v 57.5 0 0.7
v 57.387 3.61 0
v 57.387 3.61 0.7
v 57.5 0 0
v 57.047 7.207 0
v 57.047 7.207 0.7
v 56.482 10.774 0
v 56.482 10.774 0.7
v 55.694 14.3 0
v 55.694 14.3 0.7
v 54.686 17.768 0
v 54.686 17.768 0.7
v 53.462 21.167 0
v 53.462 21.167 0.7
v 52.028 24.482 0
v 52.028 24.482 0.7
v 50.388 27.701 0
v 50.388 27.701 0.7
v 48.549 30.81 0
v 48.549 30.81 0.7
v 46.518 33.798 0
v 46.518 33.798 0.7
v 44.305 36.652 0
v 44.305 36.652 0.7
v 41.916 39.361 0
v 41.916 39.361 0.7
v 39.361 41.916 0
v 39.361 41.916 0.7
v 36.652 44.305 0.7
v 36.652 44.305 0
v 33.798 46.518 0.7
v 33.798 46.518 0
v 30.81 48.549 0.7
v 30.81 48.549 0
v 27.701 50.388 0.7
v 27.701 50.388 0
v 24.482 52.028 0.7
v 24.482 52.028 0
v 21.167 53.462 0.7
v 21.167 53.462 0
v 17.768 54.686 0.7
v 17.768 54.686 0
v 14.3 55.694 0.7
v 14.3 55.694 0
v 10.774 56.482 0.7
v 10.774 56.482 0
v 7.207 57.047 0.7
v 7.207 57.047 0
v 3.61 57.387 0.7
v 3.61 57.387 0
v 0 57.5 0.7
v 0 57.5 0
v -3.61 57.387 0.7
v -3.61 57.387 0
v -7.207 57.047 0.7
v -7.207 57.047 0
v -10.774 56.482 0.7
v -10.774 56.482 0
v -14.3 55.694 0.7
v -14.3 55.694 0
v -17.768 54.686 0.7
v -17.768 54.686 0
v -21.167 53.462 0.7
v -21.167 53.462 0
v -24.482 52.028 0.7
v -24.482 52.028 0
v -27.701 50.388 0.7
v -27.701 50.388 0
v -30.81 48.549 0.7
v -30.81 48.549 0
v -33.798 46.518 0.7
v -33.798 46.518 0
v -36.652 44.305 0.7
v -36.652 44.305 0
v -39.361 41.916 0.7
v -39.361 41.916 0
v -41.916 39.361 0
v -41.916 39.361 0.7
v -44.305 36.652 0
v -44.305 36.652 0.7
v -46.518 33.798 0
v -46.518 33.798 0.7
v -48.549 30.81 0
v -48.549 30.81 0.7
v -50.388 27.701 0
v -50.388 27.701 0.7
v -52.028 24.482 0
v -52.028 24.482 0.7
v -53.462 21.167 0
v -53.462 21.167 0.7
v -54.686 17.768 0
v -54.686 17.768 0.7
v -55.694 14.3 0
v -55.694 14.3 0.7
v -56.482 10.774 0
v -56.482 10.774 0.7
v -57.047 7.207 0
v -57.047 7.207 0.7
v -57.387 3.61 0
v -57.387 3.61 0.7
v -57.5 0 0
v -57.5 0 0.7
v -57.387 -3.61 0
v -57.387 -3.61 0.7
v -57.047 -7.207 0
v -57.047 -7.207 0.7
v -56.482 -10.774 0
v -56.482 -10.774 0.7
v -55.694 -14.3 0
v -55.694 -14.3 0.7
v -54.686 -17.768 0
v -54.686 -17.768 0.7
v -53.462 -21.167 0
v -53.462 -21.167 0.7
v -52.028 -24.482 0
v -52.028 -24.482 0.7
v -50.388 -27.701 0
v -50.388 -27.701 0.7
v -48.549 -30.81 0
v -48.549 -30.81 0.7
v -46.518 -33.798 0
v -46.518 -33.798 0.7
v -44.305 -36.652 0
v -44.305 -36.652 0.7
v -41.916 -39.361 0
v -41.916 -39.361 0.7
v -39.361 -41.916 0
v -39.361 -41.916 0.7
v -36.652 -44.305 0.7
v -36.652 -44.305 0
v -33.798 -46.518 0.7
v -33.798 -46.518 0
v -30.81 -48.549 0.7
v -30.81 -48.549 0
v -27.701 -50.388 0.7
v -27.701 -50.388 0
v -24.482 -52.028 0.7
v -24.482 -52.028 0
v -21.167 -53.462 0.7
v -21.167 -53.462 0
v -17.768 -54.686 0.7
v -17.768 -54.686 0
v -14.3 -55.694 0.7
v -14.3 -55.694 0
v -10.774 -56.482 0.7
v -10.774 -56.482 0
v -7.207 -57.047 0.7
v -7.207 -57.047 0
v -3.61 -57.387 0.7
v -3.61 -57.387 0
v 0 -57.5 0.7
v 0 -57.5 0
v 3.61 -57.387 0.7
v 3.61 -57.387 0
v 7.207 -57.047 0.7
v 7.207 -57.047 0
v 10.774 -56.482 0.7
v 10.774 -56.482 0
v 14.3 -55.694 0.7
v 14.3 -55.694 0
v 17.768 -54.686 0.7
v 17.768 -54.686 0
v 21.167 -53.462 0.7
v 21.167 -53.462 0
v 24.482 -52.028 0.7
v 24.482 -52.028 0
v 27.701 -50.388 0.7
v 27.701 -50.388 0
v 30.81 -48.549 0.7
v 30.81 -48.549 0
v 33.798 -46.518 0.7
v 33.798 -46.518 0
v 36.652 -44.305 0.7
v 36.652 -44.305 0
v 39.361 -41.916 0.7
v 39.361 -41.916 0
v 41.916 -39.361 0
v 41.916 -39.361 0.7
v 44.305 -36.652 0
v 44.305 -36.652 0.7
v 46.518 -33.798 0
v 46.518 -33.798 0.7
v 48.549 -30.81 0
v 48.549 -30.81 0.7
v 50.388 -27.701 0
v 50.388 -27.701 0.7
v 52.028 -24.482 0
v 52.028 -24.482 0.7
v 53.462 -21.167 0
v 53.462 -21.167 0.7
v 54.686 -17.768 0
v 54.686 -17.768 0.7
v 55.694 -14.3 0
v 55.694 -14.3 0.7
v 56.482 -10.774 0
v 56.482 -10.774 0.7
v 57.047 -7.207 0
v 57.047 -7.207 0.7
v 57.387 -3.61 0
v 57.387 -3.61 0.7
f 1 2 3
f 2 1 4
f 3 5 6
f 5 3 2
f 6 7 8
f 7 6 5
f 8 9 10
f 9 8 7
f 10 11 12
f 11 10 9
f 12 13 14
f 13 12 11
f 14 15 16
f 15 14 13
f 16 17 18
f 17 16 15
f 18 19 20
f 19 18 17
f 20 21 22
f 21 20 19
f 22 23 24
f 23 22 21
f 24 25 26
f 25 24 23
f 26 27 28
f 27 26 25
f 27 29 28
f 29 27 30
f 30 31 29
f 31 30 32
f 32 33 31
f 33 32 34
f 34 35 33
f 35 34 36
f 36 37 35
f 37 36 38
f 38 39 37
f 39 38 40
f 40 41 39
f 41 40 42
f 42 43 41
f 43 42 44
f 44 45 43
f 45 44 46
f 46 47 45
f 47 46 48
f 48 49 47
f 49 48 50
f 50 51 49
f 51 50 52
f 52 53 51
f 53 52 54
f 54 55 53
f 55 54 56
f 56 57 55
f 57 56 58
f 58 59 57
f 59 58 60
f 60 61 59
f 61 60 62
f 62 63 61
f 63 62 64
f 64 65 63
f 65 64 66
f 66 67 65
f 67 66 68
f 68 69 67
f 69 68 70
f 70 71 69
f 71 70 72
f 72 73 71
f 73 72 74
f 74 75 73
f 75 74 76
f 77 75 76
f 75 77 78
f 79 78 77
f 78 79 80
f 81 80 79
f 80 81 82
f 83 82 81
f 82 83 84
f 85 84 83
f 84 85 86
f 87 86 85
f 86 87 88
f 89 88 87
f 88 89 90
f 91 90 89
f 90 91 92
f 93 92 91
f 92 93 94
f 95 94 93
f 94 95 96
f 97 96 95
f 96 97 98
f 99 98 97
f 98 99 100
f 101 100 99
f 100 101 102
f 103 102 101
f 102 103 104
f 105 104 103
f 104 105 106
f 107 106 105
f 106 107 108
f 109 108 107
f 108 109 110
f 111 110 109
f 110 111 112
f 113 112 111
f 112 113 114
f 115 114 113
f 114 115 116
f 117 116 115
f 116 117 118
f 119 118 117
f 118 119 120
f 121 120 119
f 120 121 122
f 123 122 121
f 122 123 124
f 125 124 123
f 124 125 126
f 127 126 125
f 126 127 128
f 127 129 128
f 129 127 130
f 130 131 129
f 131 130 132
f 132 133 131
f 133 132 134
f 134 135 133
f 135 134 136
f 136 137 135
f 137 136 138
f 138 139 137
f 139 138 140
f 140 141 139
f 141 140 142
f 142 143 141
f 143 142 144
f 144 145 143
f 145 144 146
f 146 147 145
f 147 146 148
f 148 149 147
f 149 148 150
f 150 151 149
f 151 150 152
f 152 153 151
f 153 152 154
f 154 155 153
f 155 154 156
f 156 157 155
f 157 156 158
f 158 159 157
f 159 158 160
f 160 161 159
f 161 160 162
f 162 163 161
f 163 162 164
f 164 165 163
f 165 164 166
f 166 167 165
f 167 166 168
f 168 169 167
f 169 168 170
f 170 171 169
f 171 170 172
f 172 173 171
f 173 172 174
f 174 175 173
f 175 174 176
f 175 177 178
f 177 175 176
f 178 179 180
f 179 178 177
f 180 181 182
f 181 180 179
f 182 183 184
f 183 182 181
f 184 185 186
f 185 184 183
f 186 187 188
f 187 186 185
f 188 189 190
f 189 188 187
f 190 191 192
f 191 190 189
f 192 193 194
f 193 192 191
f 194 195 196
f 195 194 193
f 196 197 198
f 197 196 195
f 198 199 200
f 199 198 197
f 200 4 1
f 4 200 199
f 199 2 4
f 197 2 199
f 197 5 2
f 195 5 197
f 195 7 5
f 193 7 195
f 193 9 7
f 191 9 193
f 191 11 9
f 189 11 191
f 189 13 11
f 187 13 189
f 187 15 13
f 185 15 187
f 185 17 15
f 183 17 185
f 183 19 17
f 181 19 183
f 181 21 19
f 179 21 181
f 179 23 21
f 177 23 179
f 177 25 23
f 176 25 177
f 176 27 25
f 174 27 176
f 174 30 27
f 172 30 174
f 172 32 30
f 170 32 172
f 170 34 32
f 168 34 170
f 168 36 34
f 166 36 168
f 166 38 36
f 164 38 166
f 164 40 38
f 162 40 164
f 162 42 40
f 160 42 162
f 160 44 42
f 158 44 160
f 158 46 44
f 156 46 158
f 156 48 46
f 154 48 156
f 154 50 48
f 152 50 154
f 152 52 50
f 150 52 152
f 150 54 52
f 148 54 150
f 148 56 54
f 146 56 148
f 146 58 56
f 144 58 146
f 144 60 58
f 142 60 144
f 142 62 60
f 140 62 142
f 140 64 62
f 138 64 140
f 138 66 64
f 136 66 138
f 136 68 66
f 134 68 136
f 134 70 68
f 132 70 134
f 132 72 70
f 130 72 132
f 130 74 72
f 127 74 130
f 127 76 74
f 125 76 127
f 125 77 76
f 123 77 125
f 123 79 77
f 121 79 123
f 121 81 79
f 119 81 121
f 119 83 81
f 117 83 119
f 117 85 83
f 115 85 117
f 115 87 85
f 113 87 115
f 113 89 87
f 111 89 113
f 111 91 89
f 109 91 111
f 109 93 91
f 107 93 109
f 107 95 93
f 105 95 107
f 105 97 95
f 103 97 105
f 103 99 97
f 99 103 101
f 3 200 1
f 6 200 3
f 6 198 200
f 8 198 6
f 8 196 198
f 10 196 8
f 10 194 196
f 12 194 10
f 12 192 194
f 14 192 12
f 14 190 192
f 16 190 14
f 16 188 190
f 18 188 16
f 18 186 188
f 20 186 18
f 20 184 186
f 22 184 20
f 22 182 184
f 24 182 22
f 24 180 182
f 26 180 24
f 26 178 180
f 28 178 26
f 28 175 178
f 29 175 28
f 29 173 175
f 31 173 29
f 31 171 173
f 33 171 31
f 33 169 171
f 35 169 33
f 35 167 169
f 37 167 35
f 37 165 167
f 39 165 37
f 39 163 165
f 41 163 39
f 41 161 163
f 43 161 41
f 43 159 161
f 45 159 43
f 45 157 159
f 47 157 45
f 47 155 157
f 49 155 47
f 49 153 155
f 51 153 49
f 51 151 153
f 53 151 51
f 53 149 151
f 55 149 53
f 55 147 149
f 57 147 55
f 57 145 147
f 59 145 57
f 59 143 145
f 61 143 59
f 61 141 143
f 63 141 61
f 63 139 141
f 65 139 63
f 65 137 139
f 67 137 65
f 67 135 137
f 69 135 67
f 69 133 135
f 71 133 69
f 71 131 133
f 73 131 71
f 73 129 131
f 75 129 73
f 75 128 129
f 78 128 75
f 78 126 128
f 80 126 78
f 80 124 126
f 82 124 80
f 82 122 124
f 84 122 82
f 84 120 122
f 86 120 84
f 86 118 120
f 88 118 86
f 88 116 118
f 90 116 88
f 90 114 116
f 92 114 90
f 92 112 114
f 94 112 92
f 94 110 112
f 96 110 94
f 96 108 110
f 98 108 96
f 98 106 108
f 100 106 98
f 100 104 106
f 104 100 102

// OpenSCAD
DIA = 115;
THICKNESS = 0.7;

$fn = 100;

cylinder(d = DIA, h = THICKNESS);
